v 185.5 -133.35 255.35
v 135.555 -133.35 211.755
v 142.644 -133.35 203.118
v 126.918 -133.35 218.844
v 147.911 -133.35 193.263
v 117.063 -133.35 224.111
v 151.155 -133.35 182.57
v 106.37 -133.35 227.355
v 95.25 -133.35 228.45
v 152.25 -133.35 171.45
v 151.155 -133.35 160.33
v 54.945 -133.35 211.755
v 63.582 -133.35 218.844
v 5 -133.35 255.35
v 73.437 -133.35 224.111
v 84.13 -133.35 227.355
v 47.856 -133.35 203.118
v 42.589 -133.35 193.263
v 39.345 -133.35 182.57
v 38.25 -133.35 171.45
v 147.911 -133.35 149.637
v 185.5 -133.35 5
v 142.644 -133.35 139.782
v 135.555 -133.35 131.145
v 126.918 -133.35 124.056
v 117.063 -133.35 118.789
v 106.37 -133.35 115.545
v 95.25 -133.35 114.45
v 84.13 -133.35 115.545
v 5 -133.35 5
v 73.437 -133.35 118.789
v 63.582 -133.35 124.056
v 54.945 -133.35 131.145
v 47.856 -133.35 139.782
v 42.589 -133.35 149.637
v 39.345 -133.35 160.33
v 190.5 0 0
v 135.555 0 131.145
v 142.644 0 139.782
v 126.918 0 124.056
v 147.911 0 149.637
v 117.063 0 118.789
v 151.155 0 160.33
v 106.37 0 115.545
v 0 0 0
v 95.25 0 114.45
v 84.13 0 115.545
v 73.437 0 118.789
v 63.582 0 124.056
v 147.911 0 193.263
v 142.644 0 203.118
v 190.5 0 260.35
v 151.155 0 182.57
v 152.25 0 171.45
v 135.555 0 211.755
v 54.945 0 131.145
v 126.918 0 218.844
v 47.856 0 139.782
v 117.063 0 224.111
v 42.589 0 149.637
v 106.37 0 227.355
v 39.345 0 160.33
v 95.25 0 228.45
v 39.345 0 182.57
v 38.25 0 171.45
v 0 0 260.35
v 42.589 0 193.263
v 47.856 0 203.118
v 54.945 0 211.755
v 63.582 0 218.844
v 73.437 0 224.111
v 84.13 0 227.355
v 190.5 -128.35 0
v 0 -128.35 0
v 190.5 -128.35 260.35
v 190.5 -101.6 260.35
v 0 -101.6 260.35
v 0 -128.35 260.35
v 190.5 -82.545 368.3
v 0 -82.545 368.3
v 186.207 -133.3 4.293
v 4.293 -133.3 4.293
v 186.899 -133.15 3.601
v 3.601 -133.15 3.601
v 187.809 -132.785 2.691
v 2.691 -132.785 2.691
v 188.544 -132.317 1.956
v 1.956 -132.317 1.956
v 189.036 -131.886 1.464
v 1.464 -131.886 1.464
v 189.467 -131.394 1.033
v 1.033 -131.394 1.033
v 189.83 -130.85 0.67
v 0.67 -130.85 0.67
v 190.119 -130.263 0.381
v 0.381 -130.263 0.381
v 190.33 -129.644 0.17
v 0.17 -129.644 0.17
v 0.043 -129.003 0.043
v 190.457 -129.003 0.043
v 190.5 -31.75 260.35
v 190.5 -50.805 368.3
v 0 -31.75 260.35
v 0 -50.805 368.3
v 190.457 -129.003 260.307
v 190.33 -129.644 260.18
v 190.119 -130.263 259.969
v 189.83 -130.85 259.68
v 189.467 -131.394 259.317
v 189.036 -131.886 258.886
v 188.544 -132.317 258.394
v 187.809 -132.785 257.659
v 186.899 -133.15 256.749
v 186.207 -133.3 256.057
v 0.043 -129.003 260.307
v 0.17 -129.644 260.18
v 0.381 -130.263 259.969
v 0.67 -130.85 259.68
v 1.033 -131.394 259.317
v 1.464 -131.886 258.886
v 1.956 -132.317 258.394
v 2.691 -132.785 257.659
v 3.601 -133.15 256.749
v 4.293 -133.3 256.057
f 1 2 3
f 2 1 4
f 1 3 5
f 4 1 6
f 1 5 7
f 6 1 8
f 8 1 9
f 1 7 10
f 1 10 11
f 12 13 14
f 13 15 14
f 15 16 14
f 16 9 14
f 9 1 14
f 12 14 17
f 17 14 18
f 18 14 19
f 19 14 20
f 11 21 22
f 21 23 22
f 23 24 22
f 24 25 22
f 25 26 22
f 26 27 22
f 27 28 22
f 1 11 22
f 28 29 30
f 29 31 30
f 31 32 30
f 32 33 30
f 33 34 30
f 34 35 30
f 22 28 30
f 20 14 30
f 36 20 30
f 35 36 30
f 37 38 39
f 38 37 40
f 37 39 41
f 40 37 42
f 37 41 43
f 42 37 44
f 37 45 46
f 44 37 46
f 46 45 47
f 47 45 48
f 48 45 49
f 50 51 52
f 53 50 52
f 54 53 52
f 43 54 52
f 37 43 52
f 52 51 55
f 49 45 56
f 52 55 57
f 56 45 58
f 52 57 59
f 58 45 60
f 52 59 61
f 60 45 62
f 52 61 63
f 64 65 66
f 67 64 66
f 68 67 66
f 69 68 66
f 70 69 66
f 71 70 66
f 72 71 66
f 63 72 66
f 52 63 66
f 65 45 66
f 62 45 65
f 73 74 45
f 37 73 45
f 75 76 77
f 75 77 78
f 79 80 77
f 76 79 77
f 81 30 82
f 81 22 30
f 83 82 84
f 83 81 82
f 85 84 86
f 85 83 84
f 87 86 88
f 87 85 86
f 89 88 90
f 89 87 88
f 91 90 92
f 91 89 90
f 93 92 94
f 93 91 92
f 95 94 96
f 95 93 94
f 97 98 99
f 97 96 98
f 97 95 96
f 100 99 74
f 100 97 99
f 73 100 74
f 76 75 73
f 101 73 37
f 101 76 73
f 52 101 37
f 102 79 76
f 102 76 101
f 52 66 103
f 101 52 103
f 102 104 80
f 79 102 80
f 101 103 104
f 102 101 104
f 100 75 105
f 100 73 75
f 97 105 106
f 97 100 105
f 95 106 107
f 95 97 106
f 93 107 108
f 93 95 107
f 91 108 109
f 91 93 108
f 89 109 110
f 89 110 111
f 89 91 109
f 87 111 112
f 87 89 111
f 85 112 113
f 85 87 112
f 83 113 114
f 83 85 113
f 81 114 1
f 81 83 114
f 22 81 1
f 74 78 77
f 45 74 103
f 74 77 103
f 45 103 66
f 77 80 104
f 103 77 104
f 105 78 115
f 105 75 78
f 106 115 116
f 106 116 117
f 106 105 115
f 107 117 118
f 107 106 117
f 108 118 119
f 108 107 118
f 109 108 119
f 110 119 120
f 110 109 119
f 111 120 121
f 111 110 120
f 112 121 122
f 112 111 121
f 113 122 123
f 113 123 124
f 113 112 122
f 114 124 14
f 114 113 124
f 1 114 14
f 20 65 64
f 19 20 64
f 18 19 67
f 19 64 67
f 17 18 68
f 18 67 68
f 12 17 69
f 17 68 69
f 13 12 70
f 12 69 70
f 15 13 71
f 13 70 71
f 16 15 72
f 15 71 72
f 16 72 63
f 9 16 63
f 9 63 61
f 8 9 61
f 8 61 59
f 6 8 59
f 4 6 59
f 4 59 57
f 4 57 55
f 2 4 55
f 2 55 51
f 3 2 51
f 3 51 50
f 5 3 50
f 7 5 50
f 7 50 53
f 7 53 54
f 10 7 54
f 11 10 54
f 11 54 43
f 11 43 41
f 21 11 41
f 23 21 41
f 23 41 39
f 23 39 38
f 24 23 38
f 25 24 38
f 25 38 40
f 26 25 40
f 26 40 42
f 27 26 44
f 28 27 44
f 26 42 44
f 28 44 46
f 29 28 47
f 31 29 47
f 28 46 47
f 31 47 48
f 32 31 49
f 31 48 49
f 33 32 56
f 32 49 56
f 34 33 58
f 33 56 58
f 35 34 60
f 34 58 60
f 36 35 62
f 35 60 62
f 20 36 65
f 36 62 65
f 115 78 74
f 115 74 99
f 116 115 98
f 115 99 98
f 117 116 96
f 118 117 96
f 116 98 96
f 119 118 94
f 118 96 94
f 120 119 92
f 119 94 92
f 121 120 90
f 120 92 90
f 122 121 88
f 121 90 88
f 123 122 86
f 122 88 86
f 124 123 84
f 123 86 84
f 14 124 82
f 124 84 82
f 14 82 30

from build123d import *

# Parameters (mm, degrees)
F1_DEPTH = 190.5
F3_D     = 114
F4_DEPTH = 2
F5_R     = 5


with BuildPart() as f1:
    # F0 (on Right) → F1 (new body)
    with BuildSketch(Plane.YZ):
        Polygon((-82.545, 368.3), (-101.6, 260.35), (-66.675, 260.35), (-66.675, 368.3), align=None)
        Polygon((-66.675, 260.35), (-31.75, 260.35), (-50.805, 368.3), (-66.675, 368.3), align=None)
        Polygon((-133.35, 0), (0, 0), (0, 260.35), (-31.75, 260.35), (-66.675, 260.35), (-101.6, 260.35), (-133.35, 260.35), align=None)
    extrude(amount=F1_DEPTH)

    # F3 (through all)
    with Locations(Plane.XZ.offset(133.35)):
        with Locations((95.25, 171.45)):
            Hole(F3_D / 2)

    # F2 (on face) → F4 (join)
    with BuildSketch(Plane.XZ.offset(133.35)):
        Polygon((133.25, 76.3), (95.25, 76.3), (57.25, 76.3), (57.25, 32.3), (133.25, 32.3), align=None)
    extrude(amount=-F4_DEPTH)

    # F5
    f5_edges = [f1.edges().sort_by_distance(p)[0] for p in [
        (0, -133.35, 130.175),
        (95.25, -133.35, 260.35),
        (190.5, -133.35, 130.175),
        (95.25, -133.35, 0),
    ]]
    fillet(f5_edges, radius=F5_R)


solid = f1.part
